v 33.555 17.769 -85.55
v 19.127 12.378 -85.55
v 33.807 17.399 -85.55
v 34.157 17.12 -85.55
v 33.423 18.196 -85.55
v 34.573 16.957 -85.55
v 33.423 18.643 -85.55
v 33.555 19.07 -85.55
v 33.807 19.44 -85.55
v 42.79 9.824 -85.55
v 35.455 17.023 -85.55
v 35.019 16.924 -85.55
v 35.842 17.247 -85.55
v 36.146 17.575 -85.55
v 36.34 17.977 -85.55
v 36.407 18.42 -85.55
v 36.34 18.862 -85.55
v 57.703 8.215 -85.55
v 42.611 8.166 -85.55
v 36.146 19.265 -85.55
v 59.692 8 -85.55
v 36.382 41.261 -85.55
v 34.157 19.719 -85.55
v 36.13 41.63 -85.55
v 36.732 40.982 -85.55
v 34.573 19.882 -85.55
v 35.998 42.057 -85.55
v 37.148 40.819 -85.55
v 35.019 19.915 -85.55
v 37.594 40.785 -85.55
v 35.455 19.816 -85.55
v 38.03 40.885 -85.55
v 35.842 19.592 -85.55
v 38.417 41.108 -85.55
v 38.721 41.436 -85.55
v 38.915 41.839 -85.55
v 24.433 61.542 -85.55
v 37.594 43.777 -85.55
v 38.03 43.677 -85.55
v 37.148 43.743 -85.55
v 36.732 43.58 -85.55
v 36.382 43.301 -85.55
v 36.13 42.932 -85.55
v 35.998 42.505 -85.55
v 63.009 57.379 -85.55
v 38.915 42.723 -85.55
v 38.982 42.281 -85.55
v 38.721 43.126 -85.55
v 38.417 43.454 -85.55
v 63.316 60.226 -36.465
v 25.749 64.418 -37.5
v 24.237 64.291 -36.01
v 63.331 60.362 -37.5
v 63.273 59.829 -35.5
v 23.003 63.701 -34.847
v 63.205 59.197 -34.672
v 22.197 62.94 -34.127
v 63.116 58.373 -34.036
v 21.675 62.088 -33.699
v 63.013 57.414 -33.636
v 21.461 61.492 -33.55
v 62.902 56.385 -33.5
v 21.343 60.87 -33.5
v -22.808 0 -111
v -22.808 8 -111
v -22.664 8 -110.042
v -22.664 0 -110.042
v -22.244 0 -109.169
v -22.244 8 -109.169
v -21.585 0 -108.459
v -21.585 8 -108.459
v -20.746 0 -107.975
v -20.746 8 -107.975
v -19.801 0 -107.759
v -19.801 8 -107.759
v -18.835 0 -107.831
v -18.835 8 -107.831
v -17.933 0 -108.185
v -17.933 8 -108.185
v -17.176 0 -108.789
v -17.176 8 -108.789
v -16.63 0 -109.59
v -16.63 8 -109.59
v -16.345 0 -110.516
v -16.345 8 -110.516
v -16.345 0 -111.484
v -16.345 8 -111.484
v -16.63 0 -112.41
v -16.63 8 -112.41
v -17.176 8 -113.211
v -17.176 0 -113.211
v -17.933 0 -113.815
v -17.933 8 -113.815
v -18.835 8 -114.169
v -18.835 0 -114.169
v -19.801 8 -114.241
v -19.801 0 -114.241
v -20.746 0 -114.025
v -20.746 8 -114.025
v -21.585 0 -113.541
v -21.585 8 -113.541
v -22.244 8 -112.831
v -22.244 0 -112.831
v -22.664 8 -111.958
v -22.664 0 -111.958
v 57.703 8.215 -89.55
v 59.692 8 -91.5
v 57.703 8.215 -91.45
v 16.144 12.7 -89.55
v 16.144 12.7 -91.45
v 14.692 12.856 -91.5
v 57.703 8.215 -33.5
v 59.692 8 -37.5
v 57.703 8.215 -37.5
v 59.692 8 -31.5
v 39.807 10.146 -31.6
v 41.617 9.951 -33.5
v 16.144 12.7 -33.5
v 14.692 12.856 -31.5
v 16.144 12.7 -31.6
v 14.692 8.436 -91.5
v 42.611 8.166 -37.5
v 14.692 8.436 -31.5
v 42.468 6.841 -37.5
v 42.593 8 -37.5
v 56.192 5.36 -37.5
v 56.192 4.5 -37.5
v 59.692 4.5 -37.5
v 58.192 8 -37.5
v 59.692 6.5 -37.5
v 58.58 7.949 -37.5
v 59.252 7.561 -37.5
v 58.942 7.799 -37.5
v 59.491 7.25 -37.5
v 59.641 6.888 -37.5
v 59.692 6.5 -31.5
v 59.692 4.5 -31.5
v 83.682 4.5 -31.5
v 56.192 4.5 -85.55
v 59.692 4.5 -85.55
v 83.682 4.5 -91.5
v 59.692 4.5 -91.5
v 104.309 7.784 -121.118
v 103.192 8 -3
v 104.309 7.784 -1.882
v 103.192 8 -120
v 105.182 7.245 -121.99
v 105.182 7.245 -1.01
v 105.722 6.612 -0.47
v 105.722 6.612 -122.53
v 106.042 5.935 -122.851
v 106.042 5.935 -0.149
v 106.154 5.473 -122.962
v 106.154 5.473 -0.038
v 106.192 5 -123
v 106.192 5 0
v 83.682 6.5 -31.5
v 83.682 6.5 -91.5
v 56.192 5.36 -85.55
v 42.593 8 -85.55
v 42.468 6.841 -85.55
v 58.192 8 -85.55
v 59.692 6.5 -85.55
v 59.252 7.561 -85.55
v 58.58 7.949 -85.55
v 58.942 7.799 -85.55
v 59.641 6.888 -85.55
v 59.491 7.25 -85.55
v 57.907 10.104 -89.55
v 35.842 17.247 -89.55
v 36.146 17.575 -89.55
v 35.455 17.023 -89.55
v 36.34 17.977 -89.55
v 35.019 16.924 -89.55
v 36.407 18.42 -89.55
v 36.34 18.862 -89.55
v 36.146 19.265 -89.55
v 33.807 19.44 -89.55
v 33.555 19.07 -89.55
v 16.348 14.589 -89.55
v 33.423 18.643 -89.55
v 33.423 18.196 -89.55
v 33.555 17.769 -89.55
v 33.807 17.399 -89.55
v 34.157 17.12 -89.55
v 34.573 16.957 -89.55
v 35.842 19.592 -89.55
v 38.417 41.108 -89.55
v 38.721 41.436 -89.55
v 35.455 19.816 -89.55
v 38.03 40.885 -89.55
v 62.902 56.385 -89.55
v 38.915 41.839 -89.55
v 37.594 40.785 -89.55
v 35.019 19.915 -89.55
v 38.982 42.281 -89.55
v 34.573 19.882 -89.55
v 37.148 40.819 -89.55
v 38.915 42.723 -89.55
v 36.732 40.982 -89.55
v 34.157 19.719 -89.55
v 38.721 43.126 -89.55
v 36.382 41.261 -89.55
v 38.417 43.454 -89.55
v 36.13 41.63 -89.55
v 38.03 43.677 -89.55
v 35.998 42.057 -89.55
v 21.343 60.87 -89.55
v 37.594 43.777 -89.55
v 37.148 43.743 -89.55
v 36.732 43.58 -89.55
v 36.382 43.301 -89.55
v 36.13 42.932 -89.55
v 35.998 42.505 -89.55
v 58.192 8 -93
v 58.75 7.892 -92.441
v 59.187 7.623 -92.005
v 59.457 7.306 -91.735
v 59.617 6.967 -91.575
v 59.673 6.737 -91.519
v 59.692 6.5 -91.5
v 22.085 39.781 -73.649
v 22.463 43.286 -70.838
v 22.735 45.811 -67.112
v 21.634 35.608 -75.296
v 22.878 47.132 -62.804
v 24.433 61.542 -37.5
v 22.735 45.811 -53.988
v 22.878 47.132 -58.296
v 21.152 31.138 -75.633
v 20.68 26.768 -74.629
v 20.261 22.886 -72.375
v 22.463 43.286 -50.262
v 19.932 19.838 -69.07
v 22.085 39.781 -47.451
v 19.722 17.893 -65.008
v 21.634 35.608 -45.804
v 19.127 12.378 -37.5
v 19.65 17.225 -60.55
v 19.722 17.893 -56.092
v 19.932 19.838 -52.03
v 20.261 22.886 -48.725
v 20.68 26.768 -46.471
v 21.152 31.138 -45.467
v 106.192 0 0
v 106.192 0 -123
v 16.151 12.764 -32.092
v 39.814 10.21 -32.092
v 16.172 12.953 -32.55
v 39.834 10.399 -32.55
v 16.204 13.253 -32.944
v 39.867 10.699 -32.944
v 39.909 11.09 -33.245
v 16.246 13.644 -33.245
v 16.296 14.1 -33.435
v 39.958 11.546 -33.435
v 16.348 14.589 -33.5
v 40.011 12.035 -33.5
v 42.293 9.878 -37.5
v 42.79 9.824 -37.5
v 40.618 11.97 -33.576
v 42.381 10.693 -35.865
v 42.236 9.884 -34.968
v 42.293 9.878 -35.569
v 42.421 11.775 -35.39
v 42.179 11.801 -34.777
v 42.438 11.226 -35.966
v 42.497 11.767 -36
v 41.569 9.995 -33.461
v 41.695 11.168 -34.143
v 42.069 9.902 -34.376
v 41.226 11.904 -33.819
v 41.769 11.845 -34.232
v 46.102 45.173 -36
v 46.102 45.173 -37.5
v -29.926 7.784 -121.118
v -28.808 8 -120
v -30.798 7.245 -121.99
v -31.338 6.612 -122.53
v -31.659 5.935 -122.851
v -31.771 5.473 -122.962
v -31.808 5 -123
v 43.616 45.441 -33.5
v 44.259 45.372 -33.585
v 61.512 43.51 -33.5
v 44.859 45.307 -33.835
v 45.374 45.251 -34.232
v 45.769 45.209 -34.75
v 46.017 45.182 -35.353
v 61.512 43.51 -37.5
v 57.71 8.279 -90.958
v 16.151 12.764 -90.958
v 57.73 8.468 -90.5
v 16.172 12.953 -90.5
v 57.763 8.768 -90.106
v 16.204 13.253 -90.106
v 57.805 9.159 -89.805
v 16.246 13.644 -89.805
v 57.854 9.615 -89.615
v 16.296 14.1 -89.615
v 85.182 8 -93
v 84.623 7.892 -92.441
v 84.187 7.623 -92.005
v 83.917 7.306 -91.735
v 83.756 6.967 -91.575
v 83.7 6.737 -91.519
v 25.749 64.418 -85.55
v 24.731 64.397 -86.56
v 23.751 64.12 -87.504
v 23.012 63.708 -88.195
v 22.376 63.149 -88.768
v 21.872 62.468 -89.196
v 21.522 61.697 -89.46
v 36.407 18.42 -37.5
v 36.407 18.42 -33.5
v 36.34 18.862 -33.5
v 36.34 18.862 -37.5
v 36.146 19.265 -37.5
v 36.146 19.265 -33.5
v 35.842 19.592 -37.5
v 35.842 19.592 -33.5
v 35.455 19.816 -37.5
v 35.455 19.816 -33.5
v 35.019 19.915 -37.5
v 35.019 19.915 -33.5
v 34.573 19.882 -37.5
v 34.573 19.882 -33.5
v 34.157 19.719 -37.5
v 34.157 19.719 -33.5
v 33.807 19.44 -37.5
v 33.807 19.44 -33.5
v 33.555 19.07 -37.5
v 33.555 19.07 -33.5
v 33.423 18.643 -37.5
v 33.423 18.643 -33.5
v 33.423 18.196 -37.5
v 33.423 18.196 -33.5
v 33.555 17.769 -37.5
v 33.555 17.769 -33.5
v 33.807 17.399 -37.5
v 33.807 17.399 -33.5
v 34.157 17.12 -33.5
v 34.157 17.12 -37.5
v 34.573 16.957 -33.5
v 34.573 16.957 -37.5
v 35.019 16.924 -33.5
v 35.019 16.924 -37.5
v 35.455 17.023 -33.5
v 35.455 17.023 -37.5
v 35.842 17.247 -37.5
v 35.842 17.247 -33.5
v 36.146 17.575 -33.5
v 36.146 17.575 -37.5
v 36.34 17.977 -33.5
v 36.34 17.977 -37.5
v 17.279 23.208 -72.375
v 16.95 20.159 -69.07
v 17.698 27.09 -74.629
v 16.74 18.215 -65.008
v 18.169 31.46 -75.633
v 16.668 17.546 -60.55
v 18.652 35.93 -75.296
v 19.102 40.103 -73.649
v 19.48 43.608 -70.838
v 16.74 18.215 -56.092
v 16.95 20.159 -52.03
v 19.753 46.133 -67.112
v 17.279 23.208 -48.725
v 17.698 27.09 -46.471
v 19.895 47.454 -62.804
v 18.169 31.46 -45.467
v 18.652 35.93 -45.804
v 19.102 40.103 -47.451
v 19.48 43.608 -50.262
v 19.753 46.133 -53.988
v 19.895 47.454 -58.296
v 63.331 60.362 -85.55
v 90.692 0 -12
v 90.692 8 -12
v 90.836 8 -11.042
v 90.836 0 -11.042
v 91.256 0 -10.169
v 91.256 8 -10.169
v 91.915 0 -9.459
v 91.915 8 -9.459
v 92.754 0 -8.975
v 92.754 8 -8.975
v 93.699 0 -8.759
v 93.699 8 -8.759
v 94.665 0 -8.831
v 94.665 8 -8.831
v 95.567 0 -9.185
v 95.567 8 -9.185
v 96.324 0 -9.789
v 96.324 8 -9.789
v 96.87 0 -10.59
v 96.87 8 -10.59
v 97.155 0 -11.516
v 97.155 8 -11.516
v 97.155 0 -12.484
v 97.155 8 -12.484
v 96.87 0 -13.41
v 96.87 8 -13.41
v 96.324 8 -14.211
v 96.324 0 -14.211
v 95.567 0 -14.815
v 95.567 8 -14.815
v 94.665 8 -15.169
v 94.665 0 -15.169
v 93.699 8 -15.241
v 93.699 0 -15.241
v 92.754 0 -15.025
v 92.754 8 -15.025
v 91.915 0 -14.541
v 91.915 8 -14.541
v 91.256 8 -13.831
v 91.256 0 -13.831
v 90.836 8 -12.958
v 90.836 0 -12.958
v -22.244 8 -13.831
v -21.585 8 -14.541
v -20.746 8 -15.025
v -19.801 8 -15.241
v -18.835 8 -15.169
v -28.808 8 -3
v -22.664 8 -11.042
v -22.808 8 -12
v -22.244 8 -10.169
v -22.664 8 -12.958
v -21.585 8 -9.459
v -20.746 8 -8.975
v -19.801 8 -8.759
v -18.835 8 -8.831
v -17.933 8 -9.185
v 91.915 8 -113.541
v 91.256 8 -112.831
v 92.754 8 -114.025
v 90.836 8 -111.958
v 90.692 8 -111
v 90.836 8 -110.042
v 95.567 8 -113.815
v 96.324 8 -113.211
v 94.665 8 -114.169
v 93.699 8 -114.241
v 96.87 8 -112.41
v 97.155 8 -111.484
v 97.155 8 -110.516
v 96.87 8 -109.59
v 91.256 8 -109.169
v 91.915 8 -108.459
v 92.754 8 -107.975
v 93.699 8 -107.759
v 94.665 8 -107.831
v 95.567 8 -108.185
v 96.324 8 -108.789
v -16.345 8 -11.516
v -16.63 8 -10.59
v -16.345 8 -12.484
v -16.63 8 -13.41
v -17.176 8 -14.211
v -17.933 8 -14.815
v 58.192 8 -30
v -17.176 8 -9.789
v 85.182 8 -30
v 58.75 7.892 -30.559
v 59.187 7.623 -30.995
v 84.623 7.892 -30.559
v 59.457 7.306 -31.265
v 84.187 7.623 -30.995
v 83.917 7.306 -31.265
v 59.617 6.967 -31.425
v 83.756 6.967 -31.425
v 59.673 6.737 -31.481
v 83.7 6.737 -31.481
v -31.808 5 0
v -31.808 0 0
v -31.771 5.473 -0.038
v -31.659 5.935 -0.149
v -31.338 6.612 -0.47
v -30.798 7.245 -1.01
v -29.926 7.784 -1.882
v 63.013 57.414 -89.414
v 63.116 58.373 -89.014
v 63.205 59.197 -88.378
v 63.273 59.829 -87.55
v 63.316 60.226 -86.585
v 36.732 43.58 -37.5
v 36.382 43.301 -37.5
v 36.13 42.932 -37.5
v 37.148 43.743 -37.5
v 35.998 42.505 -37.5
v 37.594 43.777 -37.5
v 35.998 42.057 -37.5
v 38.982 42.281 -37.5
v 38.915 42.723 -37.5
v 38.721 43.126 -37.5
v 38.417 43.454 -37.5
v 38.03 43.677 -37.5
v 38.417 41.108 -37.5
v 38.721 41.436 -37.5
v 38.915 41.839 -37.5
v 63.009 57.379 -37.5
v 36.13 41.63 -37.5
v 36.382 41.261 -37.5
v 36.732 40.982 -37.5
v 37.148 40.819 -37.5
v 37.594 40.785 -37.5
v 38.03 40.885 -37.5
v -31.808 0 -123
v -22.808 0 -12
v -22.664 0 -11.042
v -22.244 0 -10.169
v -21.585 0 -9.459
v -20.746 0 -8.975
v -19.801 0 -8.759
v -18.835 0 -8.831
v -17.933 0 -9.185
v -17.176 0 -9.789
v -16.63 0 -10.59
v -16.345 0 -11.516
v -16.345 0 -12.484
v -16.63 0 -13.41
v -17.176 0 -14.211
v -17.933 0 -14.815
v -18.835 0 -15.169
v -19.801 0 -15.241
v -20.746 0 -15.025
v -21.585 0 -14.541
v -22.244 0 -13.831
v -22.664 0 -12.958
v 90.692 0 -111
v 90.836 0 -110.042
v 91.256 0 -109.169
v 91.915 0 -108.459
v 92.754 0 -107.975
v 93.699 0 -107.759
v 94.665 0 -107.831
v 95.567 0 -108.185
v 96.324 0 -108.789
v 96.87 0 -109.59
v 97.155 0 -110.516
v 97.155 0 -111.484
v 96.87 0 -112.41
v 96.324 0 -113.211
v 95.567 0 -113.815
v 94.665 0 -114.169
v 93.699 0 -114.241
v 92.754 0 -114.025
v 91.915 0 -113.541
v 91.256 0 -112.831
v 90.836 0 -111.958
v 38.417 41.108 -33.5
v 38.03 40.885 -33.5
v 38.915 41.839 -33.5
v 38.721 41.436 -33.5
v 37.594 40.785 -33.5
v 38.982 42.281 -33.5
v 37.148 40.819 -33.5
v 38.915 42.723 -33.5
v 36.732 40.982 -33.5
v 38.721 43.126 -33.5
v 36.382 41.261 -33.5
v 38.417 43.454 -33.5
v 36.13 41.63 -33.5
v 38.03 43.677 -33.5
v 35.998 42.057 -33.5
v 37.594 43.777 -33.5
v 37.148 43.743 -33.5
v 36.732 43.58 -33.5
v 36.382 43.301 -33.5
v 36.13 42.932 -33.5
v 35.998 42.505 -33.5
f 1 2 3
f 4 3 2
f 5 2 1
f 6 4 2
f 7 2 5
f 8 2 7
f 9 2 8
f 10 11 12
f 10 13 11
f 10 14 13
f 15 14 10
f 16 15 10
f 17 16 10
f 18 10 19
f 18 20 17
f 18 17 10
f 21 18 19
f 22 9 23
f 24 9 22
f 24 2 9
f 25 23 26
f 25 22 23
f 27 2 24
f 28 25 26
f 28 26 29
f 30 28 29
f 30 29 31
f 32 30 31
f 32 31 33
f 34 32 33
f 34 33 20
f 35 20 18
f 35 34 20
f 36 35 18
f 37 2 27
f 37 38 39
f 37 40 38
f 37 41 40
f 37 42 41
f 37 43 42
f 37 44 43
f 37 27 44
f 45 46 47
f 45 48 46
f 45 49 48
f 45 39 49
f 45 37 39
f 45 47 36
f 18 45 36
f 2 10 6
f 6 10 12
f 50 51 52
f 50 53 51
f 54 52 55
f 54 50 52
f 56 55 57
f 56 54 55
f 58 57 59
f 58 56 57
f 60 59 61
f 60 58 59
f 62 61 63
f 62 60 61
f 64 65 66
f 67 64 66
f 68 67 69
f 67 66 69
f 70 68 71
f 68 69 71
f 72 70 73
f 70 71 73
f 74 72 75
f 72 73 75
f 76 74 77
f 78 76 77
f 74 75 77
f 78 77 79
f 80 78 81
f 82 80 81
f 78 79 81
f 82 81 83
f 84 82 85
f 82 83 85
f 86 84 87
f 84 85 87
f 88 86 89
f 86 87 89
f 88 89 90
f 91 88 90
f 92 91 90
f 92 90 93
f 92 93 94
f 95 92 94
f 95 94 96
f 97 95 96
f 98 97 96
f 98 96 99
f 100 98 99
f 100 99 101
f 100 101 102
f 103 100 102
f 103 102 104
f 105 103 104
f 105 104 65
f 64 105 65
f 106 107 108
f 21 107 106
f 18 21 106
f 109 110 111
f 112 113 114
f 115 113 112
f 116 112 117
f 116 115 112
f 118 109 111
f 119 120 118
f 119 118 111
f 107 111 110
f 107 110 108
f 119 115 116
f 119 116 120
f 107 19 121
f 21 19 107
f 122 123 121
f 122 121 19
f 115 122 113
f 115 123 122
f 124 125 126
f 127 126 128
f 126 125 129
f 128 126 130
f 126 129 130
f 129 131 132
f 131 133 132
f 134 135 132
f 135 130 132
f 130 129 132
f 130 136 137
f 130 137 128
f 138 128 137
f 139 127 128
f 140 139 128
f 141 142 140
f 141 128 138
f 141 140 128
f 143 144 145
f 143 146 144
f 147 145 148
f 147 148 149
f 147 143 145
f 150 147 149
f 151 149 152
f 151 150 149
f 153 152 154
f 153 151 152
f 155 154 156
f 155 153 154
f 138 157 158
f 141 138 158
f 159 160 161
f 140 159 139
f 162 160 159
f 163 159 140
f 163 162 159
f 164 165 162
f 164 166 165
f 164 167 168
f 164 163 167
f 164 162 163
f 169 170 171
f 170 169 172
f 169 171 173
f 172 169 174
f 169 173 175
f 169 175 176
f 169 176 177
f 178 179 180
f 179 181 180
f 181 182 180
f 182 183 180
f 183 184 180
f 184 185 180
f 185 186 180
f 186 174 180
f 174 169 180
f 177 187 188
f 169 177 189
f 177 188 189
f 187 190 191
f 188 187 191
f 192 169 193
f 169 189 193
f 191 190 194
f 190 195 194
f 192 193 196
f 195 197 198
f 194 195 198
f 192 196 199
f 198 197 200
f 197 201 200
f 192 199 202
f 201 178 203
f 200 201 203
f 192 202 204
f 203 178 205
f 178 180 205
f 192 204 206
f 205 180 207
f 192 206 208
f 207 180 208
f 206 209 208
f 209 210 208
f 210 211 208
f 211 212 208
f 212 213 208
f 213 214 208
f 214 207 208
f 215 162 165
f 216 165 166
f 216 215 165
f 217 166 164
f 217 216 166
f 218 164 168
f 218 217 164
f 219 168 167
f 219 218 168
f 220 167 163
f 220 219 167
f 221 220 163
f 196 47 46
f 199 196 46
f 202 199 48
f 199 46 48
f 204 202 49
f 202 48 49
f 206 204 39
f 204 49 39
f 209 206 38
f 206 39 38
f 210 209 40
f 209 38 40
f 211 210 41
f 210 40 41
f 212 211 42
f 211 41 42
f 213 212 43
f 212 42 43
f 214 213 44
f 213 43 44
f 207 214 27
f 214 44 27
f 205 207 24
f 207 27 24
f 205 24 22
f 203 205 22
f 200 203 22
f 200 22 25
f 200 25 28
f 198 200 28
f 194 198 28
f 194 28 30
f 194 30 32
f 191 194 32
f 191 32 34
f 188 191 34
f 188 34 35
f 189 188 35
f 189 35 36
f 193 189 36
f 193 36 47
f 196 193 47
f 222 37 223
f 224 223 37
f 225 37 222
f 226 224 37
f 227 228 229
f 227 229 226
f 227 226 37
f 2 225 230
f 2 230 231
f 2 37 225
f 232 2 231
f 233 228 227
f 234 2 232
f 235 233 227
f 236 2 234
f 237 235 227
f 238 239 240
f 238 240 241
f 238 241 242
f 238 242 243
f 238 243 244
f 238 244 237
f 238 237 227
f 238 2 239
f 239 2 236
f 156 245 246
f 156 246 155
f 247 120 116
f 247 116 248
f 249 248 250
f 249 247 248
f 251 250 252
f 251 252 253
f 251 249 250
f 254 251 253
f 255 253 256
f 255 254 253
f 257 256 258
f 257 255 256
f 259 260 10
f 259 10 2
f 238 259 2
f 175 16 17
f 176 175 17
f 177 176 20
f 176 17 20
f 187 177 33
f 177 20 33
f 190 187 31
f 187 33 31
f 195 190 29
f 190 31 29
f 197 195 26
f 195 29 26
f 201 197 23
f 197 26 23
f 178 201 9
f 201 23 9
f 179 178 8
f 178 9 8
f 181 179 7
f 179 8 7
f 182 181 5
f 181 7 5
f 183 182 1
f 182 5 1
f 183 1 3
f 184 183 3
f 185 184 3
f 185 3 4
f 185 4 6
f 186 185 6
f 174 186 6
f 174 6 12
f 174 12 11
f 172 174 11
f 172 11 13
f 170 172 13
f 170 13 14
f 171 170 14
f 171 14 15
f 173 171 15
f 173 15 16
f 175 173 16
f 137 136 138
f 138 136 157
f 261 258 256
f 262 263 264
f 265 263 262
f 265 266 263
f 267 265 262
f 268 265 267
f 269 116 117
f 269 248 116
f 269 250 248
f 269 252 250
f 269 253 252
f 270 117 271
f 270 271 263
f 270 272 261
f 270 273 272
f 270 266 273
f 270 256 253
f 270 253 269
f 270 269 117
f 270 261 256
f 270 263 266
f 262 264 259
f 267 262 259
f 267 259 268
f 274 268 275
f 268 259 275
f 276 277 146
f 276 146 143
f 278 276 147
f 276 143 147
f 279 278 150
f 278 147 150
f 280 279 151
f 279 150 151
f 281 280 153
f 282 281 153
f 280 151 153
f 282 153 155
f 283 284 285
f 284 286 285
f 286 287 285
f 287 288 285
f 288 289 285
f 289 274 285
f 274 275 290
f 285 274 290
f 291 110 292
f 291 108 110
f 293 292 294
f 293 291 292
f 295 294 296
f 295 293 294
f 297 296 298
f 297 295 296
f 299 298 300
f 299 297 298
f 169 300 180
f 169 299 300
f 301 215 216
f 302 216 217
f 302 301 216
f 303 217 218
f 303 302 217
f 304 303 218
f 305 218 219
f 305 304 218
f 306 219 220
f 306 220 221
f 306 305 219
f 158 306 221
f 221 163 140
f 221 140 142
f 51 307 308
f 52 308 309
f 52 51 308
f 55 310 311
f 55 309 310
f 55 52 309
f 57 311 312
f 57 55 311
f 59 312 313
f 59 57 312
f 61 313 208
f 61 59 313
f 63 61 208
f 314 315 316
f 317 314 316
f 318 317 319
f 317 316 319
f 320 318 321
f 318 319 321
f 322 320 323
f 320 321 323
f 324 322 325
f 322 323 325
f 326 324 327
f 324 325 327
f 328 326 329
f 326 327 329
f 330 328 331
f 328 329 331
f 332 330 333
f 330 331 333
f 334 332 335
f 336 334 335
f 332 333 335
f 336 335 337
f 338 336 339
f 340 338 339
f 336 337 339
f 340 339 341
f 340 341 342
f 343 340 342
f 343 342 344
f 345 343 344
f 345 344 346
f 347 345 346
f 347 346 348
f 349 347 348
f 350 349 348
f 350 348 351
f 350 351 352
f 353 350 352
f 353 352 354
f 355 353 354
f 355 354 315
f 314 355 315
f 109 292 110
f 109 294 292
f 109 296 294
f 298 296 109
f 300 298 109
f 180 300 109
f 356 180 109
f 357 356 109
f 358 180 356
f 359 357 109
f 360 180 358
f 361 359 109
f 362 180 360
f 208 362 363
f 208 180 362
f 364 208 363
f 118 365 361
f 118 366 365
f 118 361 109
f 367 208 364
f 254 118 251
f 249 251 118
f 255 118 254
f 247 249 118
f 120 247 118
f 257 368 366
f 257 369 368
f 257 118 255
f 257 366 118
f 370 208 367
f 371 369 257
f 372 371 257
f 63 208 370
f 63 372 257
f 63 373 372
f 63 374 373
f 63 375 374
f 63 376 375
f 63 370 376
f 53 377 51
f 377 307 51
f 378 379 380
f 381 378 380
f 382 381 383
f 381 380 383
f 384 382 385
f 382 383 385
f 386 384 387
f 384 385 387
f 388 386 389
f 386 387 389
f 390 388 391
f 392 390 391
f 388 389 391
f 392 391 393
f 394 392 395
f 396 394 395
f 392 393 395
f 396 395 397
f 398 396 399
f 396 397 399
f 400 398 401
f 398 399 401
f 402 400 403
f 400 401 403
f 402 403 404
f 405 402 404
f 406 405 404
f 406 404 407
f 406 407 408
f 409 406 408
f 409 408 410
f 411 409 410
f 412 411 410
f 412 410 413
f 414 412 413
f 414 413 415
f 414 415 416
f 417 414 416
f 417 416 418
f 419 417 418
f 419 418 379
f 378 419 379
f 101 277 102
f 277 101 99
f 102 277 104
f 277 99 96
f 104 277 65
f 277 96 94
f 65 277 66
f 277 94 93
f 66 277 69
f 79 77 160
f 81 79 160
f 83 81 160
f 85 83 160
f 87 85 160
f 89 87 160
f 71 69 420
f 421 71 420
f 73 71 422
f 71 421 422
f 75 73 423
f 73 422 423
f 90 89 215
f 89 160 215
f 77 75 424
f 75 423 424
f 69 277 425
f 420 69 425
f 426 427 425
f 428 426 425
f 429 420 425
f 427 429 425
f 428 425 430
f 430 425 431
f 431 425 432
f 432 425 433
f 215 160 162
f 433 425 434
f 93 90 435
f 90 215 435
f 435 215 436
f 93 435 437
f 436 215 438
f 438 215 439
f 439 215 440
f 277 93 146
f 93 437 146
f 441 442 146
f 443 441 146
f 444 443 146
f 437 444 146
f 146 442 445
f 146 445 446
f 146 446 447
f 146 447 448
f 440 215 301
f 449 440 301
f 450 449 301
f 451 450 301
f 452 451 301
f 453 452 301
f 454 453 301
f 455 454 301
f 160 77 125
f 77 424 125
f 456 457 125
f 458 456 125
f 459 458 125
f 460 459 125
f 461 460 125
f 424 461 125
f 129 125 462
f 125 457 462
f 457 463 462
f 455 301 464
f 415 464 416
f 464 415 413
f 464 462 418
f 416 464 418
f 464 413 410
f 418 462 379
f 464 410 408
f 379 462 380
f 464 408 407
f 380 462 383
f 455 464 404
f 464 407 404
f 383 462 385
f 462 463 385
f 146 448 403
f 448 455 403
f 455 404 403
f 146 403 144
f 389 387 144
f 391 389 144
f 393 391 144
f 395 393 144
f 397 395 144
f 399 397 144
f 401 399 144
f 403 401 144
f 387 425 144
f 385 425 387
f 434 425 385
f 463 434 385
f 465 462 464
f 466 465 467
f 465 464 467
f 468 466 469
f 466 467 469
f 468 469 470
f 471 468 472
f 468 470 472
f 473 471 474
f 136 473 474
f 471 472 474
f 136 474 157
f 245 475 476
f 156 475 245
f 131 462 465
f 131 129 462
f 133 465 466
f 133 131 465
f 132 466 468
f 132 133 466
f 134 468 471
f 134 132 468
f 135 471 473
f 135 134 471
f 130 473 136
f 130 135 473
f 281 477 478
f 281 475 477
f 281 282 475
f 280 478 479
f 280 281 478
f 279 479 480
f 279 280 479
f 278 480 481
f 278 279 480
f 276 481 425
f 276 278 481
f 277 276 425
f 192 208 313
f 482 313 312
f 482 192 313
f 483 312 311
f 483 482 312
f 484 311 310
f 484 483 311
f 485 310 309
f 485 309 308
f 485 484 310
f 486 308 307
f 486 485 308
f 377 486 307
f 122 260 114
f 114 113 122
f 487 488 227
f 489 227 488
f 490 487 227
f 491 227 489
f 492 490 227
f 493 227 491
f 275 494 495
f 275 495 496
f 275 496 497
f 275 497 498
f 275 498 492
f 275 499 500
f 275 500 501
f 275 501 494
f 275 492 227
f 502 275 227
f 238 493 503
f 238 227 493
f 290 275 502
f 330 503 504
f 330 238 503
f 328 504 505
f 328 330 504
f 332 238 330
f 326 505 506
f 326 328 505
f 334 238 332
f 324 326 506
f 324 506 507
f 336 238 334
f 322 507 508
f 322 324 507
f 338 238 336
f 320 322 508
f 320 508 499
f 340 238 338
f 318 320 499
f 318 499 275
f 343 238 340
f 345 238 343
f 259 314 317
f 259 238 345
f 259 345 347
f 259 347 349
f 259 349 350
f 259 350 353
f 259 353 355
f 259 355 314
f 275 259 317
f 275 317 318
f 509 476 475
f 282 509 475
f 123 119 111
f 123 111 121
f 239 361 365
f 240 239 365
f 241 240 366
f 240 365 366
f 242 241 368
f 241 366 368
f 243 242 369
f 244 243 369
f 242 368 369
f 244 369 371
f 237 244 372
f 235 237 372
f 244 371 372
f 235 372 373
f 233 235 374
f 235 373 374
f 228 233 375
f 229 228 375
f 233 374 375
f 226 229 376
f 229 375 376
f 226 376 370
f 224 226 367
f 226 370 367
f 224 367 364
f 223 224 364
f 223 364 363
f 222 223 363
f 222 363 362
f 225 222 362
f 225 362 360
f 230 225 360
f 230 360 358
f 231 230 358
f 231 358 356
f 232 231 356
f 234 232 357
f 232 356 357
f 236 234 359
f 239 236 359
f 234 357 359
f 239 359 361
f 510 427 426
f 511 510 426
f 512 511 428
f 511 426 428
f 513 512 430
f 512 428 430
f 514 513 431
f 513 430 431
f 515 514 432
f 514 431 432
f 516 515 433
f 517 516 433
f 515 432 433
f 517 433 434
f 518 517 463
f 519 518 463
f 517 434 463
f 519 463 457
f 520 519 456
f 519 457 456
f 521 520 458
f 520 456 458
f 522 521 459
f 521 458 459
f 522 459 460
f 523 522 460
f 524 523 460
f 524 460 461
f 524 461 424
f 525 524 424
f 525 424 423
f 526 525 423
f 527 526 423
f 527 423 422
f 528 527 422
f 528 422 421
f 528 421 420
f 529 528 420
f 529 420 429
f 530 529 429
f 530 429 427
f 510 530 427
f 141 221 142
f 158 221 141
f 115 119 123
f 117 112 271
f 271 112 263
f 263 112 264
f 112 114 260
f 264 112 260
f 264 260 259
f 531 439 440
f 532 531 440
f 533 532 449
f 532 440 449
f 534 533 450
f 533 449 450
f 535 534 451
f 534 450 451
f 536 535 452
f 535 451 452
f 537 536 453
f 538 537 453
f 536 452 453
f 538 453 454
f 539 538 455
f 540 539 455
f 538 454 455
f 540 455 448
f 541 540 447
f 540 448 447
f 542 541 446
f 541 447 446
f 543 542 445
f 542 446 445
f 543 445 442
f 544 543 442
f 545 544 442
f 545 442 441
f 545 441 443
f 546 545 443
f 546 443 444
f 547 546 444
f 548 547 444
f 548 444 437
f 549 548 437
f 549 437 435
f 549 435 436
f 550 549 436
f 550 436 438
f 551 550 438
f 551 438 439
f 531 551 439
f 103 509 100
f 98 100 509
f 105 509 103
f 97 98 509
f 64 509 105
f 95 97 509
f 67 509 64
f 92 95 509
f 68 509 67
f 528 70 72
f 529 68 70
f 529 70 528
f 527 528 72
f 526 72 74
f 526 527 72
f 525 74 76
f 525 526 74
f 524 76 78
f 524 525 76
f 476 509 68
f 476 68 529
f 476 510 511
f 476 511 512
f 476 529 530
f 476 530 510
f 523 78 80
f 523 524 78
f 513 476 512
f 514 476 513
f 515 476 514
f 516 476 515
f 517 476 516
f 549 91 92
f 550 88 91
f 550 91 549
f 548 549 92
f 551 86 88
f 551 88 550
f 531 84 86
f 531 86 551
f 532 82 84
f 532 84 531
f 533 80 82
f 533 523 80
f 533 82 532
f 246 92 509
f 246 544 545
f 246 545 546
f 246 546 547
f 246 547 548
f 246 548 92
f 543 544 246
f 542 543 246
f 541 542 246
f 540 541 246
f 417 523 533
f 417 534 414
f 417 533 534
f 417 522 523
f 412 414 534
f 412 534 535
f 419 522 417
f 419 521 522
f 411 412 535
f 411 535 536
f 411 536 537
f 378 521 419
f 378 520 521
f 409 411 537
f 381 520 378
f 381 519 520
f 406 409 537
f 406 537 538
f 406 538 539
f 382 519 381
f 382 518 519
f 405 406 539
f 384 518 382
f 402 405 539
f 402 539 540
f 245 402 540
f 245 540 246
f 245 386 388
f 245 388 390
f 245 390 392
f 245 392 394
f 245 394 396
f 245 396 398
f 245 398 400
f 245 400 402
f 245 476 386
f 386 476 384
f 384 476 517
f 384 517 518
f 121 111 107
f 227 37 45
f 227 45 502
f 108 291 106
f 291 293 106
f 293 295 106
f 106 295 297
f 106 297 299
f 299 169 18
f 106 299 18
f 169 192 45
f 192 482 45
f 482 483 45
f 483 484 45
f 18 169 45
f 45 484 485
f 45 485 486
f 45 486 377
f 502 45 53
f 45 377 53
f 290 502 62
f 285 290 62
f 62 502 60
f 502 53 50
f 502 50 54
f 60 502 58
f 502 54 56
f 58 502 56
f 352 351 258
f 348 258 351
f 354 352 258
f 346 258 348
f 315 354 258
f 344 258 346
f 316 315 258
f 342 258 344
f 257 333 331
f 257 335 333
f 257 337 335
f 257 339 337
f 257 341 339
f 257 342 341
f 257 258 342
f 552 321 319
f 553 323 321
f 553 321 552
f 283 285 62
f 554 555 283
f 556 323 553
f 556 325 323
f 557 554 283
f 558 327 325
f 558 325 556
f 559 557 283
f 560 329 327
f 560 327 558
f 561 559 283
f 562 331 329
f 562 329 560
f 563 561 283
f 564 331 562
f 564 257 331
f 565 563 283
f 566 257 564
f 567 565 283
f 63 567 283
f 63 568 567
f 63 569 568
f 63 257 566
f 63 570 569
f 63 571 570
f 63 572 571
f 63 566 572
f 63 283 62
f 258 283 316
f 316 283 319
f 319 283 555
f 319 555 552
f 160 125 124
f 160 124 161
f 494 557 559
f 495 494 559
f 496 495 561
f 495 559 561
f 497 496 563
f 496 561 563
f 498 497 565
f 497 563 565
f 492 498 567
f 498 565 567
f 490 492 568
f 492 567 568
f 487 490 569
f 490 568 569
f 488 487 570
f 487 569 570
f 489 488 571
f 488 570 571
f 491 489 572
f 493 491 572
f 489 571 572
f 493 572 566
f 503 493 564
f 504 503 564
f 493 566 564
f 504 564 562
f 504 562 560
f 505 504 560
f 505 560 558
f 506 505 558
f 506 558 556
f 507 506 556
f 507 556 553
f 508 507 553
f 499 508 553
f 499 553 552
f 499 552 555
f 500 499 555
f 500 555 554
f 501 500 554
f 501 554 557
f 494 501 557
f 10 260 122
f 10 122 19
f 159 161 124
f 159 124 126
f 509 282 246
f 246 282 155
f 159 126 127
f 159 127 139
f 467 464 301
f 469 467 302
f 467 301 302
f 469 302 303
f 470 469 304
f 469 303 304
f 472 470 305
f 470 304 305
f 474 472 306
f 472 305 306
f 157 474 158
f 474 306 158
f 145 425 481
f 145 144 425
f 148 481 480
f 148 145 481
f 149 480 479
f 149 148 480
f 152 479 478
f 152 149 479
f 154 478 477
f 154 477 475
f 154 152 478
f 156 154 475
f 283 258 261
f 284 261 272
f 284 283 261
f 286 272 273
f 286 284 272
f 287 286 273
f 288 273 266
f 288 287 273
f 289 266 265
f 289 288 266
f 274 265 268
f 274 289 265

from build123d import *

# Parameters (mm, degrees)
SKETCH1_W           = 138
SKETCH1_H           = 8
BOSS_EXTRUDE1_DEPTH = 123
SKETCH2_R           = 3.25
CUT_EXTRUDE1_DEPTH  = 163.694989079
BOSS_EXTRUDE2_DEPTH = 60
BOSS_EXTRUDE3_DEPTH = 49.45
SKETCH6_R           = 1.5
CUT_EXTRUDE2_DEPTH  = 153.033158476
CUT_EXTRUDE3_DEPTH  = 4
SKETCH9_R           = 15.125
CUT_EXTRUDE4_DEPTH  = 3
SKETCH10_W          = 15
SKETCH10_H          = 48.05
CUT_EXTRUDE5_DEPTH  = 3
SKETCH11_W          = 56.05
SKETCH11_H          = 3
BOSS_EXTRUDE4_DEPTH = 41.8
SKETCH12_W          = 23.99
SKETCH12_H          = 60
CUT_EXTRUDE6_DEPTH  = 3.5
FILLET1_R           = 4
FILLET3_R           = 3
FILLET5_R           = 1.9
FILLET6_R           = 1.9
FILLET7_R           = 2.5
SKETCH13_W          = 2
SKETCH13_H          = 48.05
CUT_EXTRUDE7_DEPTH  = 3.5
SKETCH14_W          = 48.05
SKETCH14_H          = 3.5
CUT_EXTRUDE8_DEPTH  = 3.5
FILLET8_R           = 1.5


with BuildPart() as part:
    # Sketch1 → Boss-Extrude1 (new body)
    with BuildSketch(Plane.XY):
        with Locations((37.191616766, 4)):
            Rectangle(SKETCH1_W, SKETCH1_H)
    extrude(amount=-BOSS_EXTRUDE1_DEPTH)

    # Sketch2 → Cut-Extrude1 (cut, through all)
    with BuildSketch(Plane(origin=(0, 8, 0), x_dir=(1, 0, 0), z_dir=(0, 1, 0))):
        with Locations(Location((-19.558383234, 12, 0), (0, 0, 180))):
            Circle(SKETCH2_R)
        with Locations(Location((93.941616766, 12, 0), (0, 0, 180))):
            Circle(SKETCH2_R)
        with Locations(Location((93.941616766, 111, 0), (0, 0, 180))):
            Circle(SKETCH2_R)
        with Locations(Location((-19.558383234, 111, 0), (0, 0, 180))):
            Circle(SKETCH2_R)
    extrude(amount=-CUT_EXTRUDE1_DEPTH, mode=Mode.SUBTRACT)


with BuildPart() as body_2:
    # Sketch3 → Boss-Extrude2 (new body)
    with BuildSketch(Plane.XY.offset(-31.5)):
        Polygon((14.691616766, 8.436407474), (59.691616766, 8), (14.691616766, 12.856407474), align=None)
    extrude(amount=-BOSS_EXTRUDE2_DEPTH)

    # Sketch5 → Boss-Extrude3 (add)
    with BuildSketch(Plane(origin=(1.540632023, 14.275663932, 0), x_dir=(0.9942269978025435, -0.10729714274173967, 0), z_dir=(0.10729714274173965, 0.9942269978025434, 0))):
        Polygon((56.48863979, 33.5), (14.68863979, 33.5), (14.68863979, 89.55), (56.48863979, 89.55), (56.48863979, 85.55), (17.68863979, 85.55), (17.68863979, 37.5), (56.48863979, 37.5), align=None)
    extrude(amount=BOSS_EXTRUDE3_DEPTH)

    # Sketch6 → Cut-Extrude2 (cut, through all)
    with BuildSketch(Plane.XY.offset(-33.5)):
        with Locations((34.906517302, 18.41952228)):
            Circle(SKETCH6_R)
        with Locations((37.481648728, 42.280970227)):
            Circle(SKETCH6_R)
    extrude(amount=-CUT_EXTRUDE2_DEPTH, mode=Mode.SUBTRACT)

    # Sketch8 → Cut-Extrude3 (cut)
    with BuildSketch(Plane(origin=(0, 0, -37.5), x_dir=(-1, 0, 0), z_dir=(0, 0, -1))):
        Polygon((-57.703162771, 8.214594285), (-42.292644305, 9.877699998), (-46.101692872, 45.17275842), (-61.512211338, 43.509652707), align=None)
    extrude(amount=-CUT_EXTRUDE3_DEPTH, mode=Mode.SUBTRACT)

    # Sketch9 → Cut-Extrude4 (cut)
    with BuildSketch(Plane(origin=(14.60384224, -1.57604908, 0), x_dir=(0, 0, 1), z_dir=(-0.9942269978025434, 0.10729714274173965, 0))):
        with Locations(Location((-60.55, 34.358555907, 0), (0, 0, 270))):
            Circle(SKETCH9_R)
    extrude(amount=-CUT_EXTRUDE4_DEPTH, mode=Mode.SUBTRACT)


with BuildPart() as cut_extrude5_tool:
    # Sketch10 → Cut-Extrude5 (new body)
    with BuildSketch(Plane(origin=(1.540632023, 14.275663932, 0), x_dir=(0.9942269978025435, -0.10729714274173967, 0), z_dir=(0.10729714274173965, 0.9942269978025434, 0))):
        with Locations((48.98863979, 61.525)):
            Rectangle(SKETCH10_W, SKETCH10_H)
    extrude(amount=-CUT_EXTRUDE5_DEPTH)


with BuildPart() as part_1:
    add(part.part)

    # Cut-Extrude5: cut by cut_extrude5_tool
    add(cut_extrude5_tool.part, mode=Mode.SUBTRACT)

    # Sketch12 → Cut-Extrude6 (cut)
    with BuildSketch(Plane(origin=(0, 8, 0), x_dir=(1, 0, 0), z_dir=(0, 1, 0))):
        with Locations((71.686616766, 61.5)):
            Rectangle(SKETCH12_W, SKETCH12_H)
    extrude(amount=-CUT_EXTRUDE6_DEPTH, mode=Mode.SUBTRACT)

    # Fillet3
    fillet3_edges = [part_1.edges().sort_by_distance(p)[0] for p in [
        (37.191616766, 8, -123),
        (37.191616766, 8, 0),
        (-31.808383234, 8, -61.5),
        (106.191616766, 8, -61.5),
    ]]
    fillet(fillet3_edges, radius=FILLET3_R)


with BuildPart() as body_2_1:
    add(body_2.part)

    # Cut-Extrude5: cut by cut_extrude5_tool
    add(cut_extrude5_tool.part, mode=Mode.SUBTRACT)

    # Sketch11 → Boss-Extrude4 (add)
    with BuildSketch(Plane(origin=(14.60384224, -1.57604908, 0), x_dir=(0, 0, 1), z_dir=(-0.9942269978025434, 0.10729714274173965, 0))):
        with Locations((-61.525, 65.308555907)):
            Rectangle(SKETCH11_W, SKETCH11_H)
    extrude(amount=-BOSS_EXTRUDE4_DEPTH)

    # Fillet1
    fillet1_edges = [body_2_1.edges().sort_by_distance(p)[0] for p in [
        (42.551553654, 62.604310604, -89.55),
        (42.551553654, 62.604310604, -33.5),
        (21.7722094, 64.846820887, -61.525),
    ]]
    fillet(fillet1_edges, radius=FILLET1_R)

    # Fillet5
    fillet5_edges = [body_2_1.edges().sort_by_distance(p)[0] for p in [
        (29.218559284, 11.288657425, -33.5),
    ]]
    fillet(fillet5_edges, radius=FILLET5_R)

    # Fillet6
    fillet6_edges = [body_2_1.edges().sort_by_distance(p)[0] for p in [
        (36.923818517, 10.457104569, -89.55),
    ]]
    fillet(fillet6_edges, radius=FILLET6_R)

    # Fillet7
    fillet7_edges = [body_2_1.edges().sort_by_distance(p)[0] for p in [
        (44.299100874, 28.469744857, -33.5),
        (42.352354855, 10.430984455, -32.943502884),
    ]]
    fillet(fillet7_edges, radius=FILLET7_R)


with BuildPart() as cut_extrude7_tool:
    # Sketch13 → Cut-Extrude7 (new body)
    with BuildSketch(Plane(origin=(1.540632023, 14.275663932, 0), x_dir=(0.9942269978025435, -0.10729714274173967, 0), z_dir=(0.10729714274173965, 0.9942269978025434, 0))):
        with Locations((57.48863979, 61.525)):
            Rectangle(SKETCH13_W, SKETCH13_H)
    extrude(amount=-CUT_EXTRUDE7_DEPTH)


with BuildPart() as part_2:
    add(part_1.part)

    # Cut-Extrude7: cut by cut_extrude7_tool
    add(cut_extrude7_tool.part, mode=Mode.SUBTRACT)

    # Sketch14 → Cut-Extrude8 (cut)
    with BuildSketch(Plane(origin=(59.691616766, 0, 0), x_dir=(0, 0, -1), z_dir=(1, 0, 0))):
        with Locations((61.525, 6.25)):
            Rectangle(SKETCH14_W, SKETCH14_H)
    extrude(amount=-CUT_EXTRUDE8_DEPTH, mode=Mode.SUBTRACT)

    # Fillet8
    fillet8_edges = [part_2.edges().sort_by_distance(p)[0] for p in [
        (59.691616766, 8, -88.525),
        (71.686616766, 8, -31.5),
        (83.681616766, 8, -61.5),
        (71.686616766, 8, -91.5),
        (59.691616766, 8, -34.5),
    ]]
    fillet(fillet8_edges, radius=FILLET8_R)


with BuildPart() as body_2_2:
    add(body_2_1.part)

    # Cut-Extrude7: cut by cut_extrude7_tool
    add(cut_extrude7_tool.part, mode=Mode.SUBTRACT)


solid = Compound([part_2.part, body_2_2.part])
